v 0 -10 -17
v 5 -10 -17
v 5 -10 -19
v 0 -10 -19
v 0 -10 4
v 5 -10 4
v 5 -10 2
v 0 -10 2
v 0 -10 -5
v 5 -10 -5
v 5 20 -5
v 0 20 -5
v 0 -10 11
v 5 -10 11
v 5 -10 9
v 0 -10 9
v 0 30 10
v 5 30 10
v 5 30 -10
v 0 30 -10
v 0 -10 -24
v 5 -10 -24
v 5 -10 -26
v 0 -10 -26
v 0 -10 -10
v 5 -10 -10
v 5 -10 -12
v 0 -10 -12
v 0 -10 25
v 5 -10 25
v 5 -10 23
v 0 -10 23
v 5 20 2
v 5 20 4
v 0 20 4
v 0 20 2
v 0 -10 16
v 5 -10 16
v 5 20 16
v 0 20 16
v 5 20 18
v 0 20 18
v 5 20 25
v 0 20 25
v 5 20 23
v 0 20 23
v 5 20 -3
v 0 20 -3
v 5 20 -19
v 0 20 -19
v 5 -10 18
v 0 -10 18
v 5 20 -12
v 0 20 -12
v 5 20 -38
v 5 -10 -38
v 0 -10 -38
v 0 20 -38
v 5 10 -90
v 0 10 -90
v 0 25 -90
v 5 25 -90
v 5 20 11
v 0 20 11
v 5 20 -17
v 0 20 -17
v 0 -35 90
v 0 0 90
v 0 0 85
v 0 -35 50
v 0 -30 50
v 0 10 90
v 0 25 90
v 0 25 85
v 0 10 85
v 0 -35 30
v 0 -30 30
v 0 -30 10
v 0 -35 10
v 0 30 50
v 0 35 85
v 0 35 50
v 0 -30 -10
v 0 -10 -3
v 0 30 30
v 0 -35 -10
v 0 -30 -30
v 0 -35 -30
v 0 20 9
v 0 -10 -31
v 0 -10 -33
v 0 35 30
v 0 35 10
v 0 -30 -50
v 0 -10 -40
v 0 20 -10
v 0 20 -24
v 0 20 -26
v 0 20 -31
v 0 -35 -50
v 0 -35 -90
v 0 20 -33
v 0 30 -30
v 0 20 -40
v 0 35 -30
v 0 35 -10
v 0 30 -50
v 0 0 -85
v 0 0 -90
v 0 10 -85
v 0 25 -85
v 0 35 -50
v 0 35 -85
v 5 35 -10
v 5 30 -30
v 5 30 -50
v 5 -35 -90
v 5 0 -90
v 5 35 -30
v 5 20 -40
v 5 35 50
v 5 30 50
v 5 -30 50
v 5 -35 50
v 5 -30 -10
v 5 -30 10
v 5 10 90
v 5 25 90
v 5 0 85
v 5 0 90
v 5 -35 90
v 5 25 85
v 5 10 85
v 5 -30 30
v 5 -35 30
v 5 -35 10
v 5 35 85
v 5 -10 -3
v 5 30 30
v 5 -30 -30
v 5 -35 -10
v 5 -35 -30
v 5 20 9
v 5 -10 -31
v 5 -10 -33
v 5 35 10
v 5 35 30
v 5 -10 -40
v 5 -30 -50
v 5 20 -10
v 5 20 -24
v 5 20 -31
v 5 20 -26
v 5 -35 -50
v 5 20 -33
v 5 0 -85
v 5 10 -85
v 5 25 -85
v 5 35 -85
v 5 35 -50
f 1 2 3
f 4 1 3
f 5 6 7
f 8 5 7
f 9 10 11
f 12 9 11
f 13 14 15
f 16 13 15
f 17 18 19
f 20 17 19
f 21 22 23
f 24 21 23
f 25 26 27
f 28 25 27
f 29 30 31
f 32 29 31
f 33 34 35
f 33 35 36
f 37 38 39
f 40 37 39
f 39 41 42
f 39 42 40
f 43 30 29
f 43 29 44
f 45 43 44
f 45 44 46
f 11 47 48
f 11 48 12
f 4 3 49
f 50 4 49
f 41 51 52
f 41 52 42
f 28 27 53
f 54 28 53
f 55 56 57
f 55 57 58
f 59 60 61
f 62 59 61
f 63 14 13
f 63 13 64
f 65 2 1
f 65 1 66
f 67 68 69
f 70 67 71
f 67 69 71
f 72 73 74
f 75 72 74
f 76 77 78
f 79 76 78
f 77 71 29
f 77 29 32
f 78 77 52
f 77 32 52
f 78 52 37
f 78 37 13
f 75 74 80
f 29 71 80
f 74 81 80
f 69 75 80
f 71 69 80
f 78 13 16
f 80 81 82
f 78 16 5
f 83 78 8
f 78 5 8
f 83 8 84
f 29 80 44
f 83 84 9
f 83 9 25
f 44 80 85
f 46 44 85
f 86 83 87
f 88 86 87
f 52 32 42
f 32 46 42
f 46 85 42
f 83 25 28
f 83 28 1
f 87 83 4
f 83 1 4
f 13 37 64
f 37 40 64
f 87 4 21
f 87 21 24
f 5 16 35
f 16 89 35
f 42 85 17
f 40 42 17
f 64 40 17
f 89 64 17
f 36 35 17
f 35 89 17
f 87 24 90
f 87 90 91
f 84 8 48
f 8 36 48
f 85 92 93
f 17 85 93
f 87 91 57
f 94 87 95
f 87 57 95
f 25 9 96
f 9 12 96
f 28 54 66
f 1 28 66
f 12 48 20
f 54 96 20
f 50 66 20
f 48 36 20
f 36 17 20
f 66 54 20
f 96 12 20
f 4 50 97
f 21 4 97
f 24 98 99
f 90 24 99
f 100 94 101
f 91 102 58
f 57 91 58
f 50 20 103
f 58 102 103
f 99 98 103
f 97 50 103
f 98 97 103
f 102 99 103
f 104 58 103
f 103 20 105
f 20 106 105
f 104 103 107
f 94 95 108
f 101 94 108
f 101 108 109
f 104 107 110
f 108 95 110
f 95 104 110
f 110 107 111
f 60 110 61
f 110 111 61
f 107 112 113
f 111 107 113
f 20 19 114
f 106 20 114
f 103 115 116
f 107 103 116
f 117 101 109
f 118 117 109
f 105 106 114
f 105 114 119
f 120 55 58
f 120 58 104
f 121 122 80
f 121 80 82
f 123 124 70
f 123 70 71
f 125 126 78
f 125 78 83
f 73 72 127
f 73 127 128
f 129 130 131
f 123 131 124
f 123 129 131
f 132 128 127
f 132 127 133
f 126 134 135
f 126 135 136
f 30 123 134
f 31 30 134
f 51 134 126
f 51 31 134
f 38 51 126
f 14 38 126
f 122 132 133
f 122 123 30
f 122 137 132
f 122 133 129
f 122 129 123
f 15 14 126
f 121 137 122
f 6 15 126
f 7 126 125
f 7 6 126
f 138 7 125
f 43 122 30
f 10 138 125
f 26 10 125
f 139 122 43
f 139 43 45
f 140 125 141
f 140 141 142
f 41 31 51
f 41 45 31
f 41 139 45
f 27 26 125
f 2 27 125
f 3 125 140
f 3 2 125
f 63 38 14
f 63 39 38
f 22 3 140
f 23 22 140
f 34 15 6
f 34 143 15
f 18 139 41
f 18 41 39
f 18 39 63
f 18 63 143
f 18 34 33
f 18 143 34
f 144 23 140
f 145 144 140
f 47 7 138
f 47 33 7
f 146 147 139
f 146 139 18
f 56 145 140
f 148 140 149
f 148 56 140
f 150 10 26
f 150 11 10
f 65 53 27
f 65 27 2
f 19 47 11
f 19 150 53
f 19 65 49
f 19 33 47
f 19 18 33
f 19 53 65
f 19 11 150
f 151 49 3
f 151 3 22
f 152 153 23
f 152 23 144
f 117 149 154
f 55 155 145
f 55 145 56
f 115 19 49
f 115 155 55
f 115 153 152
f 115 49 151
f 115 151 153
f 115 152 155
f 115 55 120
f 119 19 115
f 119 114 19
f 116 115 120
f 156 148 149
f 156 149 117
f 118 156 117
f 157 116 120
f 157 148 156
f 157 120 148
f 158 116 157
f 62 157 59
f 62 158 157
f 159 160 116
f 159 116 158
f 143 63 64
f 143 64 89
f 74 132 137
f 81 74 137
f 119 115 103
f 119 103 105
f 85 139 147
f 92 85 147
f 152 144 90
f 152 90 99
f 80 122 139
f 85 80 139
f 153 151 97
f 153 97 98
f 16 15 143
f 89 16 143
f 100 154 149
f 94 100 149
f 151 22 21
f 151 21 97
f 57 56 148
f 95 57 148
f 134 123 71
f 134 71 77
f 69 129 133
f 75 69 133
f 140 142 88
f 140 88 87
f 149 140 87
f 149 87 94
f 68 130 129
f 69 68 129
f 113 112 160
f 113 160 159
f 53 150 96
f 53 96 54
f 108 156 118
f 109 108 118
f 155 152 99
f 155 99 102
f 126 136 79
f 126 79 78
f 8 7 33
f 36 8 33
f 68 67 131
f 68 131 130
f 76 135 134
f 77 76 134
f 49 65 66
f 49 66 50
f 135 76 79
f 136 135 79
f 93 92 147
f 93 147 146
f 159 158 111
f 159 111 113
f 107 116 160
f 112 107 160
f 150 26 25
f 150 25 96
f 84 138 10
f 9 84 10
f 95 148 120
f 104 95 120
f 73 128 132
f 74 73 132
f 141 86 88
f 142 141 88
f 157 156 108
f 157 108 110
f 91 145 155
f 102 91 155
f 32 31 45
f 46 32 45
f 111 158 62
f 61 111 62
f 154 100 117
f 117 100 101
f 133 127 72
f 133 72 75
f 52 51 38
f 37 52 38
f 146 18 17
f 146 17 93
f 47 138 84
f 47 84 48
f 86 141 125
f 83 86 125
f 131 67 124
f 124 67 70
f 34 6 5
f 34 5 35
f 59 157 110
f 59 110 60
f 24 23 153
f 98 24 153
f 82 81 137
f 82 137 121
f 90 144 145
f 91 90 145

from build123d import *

# Parameters (mm, degrees)
ESQUISSE1_W             = 180
ESQUISSE1_H             = 70
BOSS_EXTRU_1_DEPTH      = 5
ESQUISSE3_W             = 5
ESQUISSE3_H             = 10
ESQUISSE3_W_2           = 20
ESQUISSE3_H_2           = 5
ENL_V_MAT_EXTRU_2_DEPTH = 5
ESQUISSE4_W             = 2
ESQUISSE4_H             = 30
ENL_V_MAT_EXTRU_3_DEPTH = 5


with BuildPart() as part:
    # Esquisse1 → Boss.-Extru.1 (new body)
    with BuildSketch(Plane(origin=(0, 0, 0), x_dir=(0, 0, -1), z_dir=(1, 0, 0))):
        Rectangle(ESQUISSE1_W, ESQUISSE1_H)
    extrude(amount=BOSS_EXTRU_1_DEPTH)

    # Esquisse3 → Enlèv. mat.-Extru.2 (cut)
    with BuildSketch(Plane(origin=(5, 0, 0), x_dir=(0, 0, -1), z_dir=(1, 0, 0))):
        with Locations((-87.5, 30)):
            Rectangle(ESQUISSE3_W, ESQUISSE3_H)
        with Locations((-87.5, 5)):
            Rectangle(ESQUISSE3_W, ESQUISSE3_H)
        with Locations((87.5, 30)):
            Rectangle(ESQUISSE3_W, ESQUISSE3_H)
        with Locations((87.5, 5)):
            Rectangle(ESQUISSE3_W, ESQUISSE3_H)
        with Locations((-40, 32.5)):
            Rectangle(ESQUISSE3_W_2, ESQUISSE3_H_2)
        with Locations((40, 32.5)):
            Rectangle(ESQUISSE3_W_2, ESQUISSE3_H_2)
        with Locations((0, 32.5)):
            Rectangle(ESQUISSE3_W_2, ESQUISSE3_H_2)
        with Locations((-40, -32.5)):
            Rectangle(ESQUISSE3_W_2, ESQUISSE3_H_2)
        with Locations((0, -32.5)):
            Rectangle(ESQUISSE3_W_2, ESQUISSE3_H_2)
        with Locations((40, -32.5)):
            Rectangle(ESQUISSE3_W_2, ESQUISSE3_H_2)
    extrude(amount=-ENL_V_MAT_EXTRU_2_DEPTH, mode=Mode.SUBTRACT)

    # Esquisse4 → Enlèv. mat.-Extru.3 (cut)
    with BuildSketch(Plane(origin=(5, 0, 0), x_dir=(0, 0, -1), z_dir=(1, 0, 0))):
        with Locations((32, 5)):
            Rectangle(ESQUISSE4_W, ESQUISSE4_H)
        with Locations((39, 5)):
            Rectangle(ESQUISSE4_W, ESQUISSE4_H)
        with Locations((25, 5)):
            Rectangle(ESQUISSE4_W, ESQUISSE4_H)
        with Locations((18, 5)):
            Rectangle(ESQUISSE4_W, ESQUISSE4_H)
        with Locations((11, 5)):
            Rectangle(ESQUISSE4_W, ESQUISSE4_H)
        with Locations((4, 5)):
            Rectangle(ESQUISSE4_W, ESQUISSE4_H)
        with Locations((-3, 5)):
            Rectangle(ESQUISSE4_W, ESQUISSE4_H)
        with Locations((-10, 5)):
            Rectangle(ESQUISSE4_W, ESQUISSE4_H)
        with Locations((-17, 5)):
            Rectangle(ESQUISSE4_W, ESQUISSE4_H)
        with Locations((-24, 5)):
            Rectangle(ESQUISSE4_W, ESQUISSE4_H)
    extrude(amount=-ENL_V_MAT_EXTRU_3_DEPTH, mode=Mode.SUBTRACT)


solid = part.part
